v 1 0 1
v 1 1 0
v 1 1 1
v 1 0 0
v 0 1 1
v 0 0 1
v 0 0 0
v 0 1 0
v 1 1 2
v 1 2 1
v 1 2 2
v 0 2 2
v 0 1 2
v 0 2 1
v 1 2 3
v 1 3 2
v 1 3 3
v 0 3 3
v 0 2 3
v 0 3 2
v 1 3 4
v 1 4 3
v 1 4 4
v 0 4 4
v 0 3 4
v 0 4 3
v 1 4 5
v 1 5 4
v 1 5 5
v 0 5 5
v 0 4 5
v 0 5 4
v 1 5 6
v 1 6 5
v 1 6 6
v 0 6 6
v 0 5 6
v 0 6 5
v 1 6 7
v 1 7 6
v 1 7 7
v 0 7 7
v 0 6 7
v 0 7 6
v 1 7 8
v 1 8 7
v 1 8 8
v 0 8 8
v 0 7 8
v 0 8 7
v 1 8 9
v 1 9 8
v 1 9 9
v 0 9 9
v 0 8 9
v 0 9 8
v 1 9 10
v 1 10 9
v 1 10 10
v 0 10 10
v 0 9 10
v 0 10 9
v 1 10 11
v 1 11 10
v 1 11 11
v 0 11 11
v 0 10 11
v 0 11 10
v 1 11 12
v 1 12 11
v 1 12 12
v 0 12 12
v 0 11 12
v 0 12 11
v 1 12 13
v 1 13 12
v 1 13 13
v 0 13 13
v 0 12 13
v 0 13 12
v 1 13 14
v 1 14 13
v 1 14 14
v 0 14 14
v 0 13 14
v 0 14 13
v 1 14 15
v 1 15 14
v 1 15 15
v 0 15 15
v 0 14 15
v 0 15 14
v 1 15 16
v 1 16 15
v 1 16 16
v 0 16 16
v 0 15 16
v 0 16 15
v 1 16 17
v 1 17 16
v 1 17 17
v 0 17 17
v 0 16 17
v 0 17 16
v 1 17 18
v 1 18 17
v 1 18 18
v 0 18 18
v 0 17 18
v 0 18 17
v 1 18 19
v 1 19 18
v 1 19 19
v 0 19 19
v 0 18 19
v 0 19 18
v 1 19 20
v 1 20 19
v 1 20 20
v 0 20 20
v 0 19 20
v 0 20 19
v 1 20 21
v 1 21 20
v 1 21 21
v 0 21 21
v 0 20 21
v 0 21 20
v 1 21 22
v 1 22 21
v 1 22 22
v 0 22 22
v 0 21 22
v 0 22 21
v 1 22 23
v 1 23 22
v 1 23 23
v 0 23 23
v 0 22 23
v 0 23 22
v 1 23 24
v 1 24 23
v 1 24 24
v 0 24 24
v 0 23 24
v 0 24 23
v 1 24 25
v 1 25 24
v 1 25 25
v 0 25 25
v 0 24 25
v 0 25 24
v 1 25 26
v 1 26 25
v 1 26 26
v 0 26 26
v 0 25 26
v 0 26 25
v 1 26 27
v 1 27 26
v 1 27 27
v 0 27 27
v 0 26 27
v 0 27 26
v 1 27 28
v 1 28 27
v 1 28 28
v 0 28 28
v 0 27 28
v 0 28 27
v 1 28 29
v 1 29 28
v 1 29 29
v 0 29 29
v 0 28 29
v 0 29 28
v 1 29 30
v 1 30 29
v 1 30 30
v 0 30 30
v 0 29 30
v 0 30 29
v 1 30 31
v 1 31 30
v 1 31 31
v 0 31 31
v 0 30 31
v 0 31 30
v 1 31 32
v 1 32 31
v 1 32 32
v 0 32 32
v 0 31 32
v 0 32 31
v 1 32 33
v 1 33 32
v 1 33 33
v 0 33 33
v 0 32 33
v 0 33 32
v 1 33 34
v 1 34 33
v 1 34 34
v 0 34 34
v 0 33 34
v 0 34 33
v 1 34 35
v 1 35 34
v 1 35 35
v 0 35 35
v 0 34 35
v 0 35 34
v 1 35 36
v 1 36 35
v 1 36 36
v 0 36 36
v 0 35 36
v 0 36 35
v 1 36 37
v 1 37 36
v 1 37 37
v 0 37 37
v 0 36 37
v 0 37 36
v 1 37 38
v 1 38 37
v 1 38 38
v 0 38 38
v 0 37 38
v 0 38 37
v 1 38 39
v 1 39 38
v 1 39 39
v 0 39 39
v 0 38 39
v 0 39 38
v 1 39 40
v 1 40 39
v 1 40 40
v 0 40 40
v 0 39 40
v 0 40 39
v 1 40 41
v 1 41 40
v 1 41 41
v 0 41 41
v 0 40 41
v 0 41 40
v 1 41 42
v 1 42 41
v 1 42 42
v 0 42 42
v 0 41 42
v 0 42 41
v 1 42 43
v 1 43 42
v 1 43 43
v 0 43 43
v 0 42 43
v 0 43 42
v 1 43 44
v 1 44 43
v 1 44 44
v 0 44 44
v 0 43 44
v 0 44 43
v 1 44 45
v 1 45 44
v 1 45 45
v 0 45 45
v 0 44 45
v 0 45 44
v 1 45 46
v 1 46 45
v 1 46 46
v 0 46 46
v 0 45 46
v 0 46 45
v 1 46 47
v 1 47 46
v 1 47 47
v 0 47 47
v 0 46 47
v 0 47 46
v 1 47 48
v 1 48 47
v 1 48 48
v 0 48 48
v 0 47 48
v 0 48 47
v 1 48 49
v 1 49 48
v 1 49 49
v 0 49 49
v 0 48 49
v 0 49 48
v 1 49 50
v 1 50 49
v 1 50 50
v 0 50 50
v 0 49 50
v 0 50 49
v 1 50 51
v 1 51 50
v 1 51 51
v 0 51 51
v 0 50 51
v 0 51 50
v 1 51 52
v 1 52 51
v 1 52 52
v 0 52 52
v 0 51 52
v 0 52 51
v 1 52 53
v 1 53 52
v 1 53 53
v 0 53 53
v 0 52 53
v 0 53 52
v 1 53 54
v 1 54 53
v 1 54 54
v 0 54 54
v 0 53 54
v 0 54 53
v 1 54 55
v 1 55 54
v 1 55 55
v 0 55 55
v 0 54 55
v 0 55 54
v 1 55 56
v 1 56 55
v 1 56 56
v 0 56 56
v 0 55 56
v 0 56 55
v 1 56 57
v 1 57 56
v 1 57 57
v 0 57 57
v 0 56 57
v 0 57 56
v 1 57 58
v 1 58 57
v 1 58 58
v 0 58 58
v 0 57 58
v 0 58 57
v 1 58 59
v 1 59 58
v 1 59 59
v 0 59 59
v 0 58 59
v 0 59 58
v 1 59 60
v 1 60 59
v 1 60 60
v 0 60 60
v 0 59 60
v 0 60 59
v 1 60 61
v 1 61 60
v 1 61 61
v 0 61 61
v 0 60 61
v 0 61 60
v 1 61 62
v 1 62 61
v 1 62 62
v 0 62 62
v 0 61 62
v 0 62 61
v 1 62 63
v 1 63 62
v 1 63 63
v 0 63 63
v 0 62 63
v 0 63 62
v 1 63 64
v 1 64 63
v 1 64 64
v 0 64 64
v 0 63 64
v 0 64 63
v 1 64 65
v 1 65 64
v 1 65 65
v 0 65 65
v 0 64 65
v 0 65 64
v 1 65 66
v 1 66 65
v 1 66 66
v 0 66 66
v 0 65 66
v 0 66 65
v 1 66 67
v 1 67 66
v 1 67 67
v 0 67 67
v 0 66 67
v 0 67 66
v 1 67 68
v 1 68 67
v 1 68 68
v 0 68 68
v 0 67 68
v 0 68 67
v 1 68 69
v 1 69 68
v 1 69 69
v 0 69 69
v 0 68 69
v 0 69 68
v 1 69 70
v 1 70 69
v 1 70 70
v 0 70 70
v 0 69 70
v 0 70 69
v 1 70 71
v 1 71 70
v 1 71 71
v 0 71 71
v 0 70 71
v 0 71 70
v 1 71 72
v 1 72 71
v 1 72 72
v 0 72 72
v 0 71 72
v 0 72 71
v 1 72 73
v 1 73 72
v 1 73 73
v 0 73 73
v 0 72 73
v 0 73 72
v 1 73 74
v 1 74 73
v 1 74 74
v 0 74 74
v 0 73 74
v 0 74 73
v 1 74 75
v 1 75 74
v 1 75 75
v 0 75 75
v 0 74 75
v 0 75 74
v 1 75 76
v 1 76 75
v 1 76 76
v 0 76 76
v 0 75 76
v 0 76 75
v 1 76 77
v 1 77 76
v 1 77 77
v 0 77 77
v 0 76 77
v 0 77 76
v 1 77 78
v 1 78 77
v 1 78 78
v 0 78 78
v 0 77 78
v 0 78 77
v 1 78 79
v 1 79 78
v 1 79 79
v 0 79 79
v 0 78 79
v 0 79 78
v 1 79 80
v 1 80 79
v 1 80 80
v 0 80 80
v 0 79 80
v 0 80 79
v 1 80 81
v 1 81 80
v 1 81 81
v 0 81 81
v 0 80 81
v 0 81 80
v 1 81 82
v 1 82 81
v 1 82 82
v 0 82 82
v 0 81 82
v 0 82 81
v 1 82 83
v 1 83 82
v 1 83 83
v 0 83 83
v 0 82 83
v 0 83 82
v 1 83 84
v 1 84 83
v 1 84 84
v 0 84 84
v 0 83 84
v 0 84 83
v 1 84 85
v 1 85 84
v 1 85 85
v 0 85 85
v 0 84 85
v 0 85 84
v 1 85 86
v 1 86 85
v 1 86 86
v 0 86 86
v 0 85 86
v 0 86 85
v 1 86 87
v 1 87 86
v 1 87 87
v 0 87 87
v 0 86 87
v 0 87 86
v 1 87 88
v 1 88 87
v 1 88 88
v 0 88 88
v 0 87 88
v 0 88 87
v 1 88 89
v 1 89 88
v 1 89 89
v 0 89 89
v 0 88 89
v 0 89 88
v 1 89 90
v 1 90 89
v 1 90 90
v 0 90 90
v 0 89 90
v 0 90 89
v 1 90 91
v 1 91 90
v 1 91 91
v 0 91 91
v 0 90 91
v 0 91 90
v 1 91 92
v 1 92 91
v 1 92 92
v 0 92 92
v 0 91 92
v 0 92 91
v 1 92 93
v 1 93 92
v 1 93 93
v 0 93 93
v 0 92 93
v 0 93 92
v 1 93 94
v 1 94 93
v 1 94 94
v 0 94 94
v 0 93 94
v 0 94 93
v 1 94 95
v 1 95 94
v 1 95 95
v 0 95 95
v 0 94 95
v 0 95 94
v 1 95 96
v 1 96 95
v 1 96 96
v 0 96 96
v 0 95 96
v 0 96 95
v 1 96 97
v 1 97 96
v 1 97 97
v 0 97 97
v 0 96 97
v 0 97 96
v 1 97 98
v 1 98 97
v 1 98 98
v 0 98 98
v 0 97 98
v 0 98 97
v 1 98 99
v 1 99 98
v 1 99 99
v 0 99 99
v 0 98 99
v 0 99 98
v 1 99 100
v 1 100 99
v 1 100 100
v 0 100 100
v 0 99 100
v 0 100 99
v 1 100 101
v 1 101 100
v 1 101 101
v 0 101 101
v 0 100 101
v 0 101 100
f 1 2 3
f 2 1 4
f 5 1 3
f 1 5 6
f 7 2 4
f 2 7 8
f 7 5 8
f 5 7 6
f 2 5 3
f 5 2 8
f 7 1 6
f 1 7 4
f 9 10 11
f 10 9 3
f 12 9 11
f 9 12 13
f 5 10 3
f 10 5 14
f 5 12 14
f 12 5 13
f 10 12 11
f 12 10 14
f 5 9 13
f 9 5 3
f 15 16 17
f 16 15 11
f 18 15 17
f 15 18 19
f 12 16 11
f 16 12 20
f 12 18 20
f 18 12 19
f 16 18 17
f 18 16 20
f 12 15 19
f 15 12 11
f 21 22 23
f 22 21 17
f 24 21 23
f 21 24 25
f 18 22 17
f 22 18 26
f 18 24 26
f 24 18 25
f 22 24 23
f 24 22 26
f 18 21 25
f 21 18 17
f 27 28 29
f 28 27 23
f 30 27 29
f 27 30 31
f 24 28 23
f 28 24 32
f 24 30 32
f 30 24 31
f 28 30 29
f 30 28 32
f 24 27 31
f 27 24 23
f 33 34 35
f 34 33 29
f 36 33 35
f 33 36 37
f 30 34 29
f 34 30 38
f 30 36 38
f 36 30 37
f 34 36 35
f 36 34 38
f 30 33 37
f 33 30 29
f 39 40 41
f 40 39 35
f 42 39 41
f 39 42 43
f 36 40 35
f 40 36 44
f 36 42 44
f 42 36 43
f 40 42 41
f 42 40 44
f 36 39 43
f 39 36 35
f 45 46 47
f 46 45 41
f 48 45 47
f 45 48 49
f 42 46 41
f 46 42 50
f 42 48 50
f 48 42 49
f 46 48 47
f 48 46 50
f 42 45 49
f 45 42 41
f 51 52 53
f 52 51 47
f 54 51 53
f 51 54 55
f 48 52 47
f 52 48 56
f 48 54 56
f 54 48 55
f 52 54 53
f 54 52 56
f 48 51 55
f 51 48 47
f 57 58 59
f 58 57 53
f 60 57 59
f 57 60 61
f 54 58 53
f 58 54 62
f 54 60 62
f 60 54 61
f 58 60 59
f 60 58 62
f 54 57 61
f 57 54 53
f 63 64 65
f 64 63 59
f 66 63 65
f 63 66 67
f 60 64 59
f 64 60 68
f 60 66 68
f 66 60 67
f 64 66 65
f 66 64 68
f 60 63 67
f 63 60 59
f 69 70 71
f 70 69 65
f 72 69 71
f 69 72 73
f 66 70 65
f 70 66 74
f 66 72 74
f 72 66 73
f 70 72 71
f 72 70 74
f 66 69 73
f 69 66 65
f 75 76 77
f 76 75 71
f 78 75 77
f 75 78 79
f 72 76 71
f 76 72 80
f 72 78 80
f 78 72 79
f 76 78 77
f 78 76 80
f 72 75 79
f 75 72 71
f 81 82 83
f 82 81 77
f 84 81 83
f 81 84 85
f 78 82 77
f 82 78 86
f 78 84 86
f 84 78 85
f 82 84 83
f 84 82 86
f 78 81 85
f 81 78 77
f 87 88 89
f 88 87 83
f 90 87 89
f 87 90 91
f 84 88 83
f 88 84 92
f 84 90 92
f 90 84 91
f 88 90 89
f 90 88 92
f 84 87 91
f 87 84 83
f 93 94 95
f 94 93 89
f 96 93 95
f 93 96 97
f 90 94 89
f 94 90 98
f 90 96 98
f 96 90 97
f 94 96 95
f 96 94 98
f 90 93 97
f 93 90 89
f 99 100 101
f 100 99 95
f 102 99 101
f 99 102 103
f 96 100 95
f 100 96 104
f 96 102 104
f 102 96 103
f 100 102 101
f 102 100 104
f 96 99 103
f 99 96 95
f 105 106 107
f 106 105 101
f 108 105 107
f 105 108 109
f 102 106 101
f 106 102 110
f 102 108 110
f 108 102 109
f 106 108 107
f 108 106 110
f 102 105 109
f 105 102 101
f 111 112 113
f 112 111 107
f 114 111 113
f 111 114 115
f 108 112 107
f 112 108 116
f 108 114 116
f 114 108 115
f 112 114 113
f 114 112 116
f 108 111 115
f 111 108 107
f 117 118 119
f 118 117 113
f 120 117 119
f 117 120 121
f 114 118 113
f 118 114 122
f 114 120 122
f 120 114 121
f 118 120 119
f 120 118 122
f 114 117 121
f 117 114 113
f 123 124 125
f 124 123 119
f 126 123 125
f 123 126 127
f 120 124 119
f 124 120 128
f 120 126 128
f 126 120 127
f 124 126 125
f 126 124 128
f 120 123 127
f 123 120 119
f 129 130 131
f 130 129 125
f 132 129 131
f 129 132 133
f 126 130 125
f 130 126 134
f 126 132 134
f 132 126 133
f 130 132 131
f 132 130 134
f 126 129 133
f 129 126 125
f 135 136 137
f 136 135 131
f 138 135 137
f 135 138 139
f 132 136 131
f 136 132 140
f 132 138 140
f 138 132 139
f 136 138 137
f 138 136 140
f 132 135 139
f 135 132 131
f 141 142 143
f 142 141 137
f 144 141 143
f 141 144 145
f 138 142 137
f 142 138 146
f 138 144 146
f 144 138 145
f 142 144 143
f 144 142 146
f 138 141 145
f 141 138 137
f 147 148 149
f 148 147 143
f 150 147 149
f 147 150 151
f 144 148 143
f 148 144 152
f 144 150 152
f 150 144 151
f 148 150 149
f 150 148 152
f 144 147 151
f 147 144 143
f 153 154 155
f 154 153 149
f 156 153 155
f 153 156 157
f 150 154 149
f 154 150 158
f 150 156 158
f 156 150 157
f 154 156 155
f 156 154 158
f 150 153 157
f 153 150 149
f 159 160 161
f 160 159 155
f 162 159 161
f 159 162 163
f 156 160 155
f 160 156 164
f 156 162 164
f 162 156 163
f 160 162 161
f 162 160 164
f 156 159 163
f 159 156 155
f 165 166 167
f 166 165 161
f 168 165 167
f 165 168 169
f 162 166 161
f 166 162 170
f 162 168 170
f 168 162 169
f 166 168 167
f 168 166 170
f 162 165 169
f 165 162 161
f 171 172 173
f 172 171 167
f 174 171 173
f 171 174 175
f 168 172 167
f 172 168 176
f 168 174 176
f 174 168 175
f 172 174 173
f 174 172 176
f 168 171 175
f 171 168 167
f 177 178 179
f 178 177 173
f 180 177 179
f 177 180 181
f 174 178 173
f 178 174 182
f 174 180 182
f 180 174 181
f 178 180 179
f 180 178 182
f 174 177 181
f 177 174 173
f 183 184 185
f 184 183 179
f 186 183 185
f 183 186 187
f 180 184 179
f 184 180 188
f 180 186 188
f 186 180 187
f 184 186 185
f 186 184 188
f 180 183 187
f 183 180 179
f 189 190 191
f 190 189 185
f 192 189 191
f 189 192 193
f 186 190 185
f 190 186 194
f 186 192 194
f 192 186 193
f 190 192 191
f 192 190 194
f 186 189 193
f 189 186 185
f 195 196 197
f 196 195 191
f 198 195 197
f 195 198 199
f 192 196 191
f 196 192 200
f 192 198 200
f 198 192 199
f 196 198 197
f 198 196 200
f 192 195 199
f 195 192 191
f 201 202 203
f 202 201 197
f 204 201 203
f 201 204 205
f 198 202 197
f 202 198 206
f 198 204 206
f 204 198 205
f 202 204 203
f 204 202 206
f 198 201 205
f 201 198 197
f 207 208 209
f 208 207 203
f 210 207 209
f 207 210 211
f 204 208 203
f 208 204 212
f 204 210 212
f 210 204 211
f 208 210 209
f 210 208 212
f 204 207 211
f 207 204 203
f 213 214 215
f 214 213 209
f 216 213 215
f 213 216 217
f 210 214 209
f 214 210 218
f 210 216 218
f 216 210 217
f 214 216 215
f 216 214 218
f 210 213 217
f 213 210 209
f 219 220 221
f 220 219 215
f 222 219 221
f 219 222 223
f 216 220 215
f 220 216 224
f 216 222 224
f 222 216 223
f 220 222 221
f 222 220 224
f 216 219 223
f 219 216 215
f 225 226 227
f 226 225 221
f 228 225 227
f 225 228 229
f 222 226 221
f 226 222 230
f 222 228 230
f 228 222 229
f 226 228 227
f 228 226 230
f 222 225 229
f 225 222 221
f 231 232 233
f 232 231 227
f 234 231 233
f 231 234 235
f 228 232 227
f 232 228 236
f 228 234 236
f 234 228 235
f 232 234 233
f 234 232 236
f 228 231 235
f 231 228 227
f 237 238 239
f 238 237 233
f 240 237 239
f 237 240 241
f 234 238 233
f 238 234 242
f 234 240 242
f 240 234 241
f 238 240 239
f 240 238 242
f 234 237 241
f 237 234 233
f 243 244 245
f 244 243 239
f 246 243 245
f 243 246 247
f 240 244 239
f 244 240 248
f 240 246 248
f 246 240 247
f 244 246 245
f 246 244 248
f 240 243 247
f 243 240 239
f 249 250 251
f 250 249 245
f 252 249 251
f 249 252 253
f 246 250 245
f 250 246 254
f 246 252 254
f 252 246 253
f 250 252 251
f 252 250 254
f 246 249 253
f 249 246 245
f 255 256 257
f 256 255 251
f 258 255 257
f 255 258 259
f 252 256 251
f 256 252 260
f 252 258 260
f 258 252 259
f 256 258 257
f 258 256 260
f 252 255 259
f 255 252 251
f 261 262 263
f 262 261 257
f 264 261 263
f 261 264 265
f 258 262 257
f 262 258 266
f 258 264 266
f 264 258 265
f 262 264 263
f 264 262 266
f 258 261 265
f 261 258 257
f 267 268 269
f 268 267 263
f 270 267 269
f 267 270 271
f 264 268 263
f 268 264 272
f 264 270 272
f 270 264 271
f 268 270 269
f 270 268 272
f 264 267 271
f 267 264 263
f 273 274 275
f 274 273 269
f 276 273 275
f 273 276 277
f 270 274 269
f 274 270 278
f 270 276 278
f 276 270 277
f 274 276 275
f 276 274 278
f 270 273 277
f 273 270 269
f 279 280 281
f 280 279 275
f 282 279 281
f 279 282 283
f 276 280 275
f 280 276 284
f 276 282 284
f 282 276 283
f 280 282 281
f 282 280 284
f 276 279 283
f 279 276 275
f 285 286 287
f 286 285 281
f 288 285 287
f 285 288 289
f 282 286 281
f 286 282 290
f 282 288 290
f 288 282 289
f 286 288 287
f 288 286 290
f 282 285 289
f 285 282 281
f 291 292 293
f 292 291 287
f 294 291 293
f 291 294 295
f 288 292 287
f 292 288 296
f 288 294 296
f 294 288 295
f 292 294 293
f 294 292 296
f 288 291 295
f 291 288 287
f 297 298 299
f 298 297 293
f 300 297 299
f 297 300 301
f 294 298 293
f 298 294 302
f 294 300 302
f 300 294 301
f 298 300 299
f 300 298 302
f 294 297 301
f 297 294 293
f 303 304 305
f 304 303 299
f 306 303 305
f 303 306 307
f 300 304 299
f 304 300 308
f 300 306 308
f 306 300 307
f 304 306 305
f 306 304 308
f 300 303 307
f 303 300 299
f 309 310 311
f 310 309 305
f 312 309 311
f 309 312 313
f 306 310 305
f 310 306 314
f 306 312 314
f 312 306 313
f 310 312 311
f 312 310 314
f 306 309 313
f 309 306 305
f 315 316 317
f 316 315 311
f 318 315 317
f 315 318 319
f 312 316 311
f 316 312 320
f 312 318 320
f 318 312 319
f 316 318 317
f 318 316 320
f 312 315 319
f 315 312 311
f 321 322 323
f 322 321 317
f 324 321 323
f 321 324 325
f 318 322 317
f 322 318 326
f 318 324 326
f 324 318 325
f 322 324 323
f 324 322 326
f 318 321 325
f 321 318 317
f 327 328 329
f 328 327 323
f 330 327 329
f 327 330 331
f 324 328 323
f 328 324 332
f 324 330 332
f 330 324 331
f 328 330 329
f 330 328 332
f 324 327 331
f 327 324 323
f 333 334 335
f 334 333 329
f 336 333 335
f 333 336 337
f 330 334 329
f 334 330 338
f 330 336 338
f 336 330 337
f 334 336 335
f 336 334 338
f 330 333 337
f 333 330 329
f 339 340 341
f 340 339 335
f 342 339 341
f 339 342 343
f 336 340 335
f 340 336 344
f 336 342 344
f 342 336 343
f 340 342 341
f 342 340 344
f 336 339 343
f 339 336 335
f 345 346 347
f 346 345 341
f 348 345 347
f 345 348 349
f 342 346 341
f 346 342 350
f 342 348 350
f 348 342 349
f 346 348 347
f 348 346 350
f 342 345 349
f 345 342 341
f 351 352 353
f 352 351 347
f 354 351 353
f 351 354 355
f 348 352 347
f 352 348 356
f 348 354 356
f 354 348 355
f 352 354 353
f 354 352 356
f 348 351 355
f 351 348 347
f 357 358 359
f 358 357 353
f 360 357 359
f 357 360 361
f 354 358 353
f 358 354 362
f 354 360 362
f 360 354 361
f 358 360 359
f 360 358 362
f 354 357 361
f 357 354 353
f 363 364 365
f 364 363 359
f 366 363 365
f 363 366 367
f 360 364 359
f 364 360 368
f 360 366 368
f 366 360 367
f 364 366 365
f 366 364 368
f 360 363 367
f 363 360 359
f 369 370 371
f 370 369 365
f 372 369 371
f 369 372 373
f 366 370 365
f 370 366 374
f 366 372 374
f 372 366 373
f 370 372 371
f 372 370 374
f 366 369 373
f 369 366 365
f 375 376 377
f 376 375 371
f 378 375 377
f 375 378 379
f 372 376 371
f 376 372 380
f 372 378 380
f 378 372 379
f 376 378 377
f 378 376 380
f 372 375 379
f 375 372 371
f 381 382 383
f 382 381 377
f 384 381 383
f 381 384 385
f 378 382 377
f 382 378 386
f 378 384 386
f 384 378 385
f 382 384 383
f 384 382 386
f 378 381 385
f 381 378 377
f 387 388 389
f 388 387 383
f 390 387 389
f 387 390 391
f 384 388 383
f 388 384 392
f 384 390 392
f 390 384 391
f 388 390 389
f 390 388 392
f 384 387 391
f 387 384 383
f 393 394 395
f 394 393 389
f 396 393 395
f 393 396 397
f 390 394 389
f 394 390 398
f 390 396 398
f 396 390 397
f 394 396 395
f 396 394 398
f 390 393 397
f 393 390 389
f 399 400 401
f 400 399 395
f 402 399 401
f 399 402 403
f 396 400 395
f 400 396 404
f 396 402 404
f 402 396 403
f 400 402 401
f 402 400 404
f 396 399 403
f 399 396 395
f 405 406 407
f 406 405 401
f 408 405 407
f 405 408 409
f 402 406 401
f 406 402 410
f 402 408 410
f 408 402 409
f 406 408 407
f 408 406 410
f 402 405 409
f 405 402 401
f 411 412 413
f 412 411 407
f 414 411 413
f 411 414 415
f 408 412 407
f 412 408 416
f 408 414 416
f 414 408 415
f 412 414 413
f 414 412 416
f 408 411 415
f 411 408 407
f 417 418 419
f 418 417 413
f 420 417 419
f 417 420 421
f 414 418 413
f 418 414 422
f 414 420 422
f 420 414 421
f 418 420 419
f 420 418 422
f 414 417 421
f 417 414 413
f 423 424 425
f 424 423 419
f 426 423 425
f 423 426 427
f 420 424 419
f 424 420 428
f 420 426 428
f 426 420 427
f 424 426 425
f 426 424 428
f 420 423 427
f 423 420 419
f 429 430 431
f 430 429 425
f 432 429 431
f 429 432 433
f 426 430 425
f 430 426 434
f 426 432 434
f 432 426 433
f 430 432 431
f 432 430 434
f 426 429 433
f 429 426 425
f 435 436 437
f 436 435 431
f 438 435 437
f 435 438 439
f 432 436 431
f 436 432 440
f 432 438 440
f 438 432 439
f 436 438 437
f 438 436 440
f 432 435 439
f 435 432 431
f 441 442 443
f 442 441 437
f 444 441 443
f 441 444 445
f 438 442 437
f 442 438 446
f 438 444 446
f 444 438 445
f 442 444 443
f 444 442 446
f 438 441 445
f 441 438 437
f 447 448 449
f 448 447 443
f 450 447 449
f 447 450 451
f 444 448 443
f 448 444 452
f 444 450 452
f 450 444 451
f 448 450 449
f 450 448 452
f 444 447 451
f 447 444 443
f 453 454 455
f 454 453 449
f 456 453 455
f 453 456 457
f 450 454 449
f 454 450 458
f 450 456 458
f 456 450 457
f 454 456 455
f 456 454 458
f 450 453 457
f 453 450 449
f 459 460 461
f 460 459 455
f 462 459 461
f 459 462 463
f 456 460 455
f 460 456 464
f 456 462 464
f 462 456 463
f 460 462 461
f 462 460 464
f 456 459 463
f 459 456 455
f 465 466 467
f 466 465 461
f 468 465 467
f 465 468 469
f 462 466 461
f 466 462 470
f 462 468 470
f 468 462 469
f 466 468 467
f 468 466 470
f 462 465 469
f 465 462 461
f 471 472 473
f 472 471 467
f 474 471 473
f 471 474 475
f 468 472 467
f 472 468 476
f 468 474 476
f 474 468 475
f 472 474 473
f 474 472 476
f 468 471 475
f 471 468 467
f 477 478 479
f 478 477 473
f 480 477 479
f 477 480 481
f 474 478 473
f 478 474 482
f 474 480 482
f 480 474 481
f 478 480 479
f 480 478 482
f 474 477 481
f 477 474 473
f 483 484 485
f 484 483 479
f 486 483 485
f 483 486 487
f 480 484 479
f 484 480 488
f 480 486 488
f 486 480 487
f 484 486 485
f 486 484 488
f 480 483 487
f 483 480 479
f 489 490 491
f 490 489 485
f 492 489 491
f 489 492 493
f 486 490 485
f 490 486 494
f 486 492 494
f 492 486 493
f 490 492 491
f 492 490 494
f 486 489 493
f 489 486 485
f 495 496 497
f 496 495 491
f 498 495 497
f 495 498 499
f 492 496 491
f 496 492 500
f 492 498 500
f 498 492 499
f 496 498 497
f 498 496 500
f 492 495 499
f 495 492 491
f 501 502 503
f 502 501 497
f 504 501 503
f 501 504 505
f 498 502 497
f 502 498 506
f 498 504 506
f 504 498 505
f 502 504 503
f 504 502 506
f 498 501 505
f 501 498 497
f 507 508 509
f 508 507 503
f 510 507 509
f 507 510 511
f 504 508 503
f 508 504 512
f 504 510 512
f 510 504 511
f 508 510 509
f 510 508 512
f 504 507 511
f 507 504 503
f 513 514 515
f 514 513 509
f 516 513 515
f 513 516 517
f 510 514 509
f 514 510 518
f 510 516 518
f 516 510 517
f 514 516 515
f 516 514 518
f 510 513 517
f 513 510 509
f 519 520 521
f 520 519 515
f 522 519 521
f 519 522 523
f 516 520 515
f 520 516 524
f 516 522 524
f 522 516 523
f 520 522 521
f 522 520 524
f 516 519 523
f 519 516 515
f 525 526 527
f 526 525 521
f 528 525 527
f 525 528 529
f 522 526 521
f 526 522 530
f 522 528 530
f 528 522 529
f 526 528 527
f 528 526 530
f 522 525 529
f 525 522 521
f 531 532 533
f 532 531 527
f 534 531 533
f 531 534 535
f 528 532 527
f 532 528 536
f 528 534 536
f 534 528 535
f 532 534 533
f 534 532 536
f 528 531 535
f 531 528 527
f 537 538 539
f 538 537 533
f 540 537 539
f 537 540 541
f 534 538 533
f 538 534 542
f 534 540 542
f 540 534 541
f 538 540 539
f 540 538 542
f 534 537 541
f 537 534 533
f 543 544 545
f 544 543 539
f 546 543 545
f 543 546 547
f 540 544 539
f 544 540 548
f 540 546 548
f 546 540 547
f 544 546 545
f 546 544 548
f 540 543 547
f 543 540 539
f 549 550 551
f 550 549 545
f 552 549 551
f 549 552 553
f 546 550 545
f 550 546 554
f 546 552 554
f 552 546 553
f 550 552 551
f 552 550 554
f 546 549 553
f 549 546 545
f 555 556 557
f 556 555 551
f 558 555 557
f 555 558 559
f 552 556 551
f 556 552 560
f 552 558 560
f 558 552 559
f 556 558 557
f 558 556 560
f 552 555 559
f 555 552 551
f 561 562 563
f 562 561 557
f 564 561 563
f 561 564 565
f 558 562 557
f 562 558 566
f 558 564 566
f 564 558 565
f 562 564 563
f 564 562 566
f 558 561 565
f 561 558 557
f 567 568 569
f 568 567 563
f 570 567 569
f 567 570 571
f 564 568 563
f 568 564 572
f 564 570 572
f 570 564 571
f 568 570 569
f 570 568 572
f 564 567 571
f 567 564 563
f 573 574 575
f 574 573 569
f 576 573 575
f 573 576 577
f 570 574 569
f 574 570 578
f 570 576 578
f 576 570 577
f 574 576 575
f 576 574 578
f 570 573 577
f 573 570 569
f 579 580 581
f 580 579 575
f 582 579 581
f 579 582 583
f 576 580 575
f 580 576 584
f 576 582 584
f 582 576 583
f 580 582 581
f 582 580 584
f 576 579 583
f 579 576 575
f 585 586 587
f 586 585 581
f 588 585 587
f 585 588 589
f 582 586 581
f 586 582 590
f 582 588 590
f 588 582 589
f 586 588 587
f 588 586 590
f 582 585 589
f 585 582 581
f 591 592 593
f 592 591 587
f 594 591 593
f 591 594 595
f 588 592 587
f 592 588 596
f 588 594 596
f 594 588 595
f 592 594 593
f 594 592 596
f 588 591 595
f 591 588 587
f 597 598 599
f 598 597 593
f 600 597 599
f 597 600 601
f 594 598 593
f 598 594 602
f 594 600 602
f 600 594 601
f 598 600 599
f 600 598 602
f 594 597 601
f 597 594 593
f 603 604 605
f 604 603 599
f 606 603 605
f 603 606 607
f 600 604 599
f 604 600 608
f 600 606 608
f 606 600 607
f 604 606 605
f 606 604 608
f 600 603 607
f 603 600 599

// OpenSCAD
x=0;
y=0;
z=0;
lt=10;
gr=0;

for(i=[0:100]){
    if(i%lt){
        translate([x,y+i,z]){
            color([1,0,0])
            cube(1);
        }
        gr=gr+1;
    } else {
        translate([x,y+i,z]){
            color([0,1,0])
            cube(1);
        }
    }
    echo(gr);
    z=z+i;
}
